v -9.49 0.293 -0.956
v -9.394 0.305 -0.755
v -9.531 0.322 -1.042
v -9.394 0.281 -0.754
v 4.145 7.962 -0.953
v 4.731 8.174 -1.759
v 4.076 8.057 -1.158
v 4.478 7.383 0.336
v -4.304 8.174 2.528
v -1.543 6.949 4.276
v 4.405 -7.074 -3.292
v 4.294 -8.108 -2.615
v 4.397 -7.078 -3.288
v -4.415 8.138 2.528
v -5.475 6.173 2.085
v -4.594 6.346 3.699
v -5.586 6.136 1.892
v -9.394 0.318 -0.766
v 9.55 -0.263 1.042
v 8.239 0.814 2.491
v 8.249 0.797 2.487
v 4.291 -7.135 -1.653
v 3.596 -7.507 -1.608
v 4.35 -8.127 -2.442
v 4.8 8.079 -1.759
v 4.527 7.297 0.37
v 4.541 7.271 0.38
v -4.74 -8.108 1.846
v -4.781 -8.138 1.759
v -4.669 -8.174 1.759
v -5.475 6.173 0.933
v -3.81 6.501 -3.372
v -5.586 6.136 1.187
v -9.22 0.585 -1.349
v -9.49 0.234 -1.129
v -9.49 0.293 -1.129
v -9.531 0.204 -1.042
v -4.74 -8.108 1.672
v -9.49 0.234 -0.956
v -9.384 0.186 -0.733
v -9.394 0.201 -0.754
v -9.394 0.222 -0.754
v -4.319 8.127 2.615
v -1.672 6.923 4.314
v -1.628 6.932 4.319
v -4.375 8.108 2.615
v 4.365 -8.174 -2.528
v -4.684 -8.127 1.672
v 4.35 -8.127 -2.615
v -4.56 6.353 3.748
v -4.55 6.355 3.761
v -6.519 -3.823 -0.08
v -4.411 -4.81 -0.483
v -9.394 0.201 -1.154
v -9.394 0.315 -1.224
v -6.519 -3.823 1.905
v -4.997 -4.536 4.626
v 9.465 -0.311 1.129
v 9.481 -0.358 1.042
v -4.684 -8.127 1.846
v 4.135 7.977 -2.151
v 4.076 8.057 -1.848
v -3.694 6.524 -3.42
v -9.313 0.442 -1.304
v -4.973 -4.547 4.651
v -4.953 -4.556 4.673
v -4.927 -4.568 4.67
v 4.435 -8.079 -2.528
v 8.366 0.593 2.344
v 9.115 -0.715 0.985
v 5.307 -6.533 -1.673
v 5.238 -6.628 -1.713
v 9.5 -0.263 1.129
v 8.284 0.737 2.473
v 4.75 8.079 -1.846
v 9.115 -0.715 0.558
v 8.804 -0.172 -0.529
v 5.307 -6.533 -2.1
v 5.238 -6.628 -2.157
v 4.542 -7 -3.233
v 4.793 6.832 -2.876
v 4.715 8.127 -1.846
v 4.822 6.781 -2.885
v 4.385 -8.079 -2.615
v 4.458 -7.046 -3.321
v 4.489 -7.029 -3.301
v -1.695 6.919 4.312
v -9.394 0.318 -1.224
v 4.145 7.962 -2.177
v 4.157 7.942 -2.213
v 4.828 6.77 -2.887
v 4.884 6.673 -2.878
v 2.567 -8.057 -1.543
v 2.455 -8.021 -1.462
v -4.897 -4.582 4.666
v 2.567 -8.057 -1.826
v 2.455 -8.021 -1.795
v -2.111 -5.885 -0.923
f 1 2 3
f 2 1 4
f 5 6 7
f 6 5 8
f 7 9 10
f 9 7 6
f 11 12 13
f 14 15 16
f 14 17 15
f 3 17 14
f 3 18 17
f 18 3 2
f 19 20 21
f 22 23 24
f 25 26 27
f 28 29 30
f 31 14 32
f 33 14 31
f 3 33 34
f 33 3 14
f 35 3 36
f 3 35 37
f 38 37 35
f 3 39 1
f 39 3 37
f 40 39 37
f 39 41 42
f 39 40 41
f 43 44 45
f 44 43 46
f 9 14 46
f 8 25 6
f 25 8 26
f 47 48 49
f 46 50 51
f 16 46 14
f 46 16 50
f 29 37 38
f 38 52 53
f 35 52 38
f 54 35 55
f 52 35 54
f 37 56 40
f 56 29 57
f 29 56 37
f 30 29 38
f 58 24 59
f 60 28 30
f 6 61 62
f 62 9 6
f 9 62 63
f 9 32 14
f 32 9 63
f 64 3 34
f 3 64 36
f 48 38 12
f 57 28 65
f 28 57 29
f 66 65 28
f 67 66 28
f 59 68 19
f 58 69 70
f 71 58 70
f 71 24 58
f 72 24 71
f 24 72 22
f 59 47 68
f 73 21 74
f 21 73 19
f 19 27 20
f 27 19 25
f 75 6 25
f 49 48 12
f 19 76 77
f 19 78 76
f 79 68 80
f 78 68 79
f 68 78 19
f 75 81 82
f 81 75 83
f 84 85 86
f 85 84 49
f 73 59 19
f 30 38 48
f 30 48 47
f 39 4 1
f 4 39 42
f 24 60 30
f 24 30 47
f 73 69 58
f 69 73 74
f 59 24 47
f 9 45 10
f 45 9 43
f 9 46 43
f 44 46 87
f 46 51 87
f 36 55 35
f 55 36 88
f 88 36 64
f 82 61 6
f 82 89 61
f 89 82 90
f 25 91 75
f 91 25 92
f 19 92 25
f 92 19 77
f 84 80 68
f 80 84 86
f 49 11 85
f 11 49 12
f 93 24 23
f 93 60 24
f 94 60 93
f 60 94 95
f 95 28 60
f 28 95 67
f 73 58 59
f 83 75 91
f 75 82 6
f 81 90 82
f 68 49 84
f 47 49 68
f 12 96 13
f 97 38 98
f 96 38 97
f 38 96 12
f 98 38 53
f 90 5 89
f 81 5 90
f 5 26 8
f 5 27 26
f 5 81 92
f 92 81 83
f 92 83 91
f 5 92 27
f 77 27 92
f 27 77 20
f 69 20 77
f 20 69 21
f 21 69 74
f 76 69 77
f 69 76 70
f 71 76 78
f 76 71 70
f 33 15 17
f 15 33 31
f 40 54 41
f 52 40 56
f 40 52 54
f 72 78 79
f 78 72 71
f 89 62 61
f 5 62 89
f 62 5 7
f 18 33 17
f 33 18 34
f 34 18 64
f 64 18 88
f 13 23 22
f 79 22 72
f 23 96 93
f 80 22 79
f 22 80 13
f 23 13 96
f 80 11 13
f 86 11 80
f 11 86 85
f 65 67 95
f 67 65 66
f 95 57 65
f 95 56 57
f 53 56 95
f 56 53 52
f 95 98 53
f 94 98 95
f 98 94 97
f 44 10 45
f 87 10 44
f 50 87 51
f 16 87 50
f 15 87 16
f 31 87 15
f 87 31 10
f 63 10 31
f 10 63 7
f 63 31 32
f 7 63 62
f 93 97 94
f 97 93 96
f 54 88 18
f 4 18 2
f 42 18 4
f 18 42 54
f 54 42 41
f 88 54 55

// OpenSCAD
// Auto-generated OpenSCAD file

    inner_points = 10*[[-0.9313235840465552, 0.025941713534936496, 0.24961039887898973], [0.18176070420337553, 0.09962140742080969, -0.9224171855702517], [-0.21156256215452457, -0.14515796252296415, 0.9224171855702517], [0.9015217260954063, -0.07147826863709097, -0.24961039887898973], [-0.6438494477287671, -0.3764461593931605, -0.6195516232254873], [-0.5505502074210448, 0.607754695616786, -0.46907262550257495], [0.5207483494698958, -0.6532912507189405, 0.46907262550257495], [0.6140475897776181, 0.330909604291006, 0.6195516232254873], [0.2535803612941774, -0.7962352175813989, -0.48391650792537955], [0.4045417032366162, 0.7962352175814017, -0.24043637501668932]];

    outer_points = 10*[[-0.46997284627252917, -0.8078951994968868, 0.17589589984947596], [-0.43345305778897786, 0.8078951994968868, 0.25284835477167783], [0.43345305778897786, -0.8078951994968868, -0.25284835477167783], [0.46997284627252917, 0.8078951994968868, -0.17589589984947596], [-0.9449617853062939, 0.026321601166102375, -0.10422521197036727], [-0.5168120337823261, -0.026321601166102375, 0.7979479884286332], [0.5168120337823261, 0.026321601166102375, -0.7979479884286332], [0.9449617853062939, -0.026321601166102375, 0.10422521197036727], [-0.3350951898479052, 0.5418959379620255, -0.7060938346625941], [0.3576656603926969, 0.45671744731188046, 0.753653067322259]];

    // Convex hull for inner set (I)
    module inner_hull() {
        hull() {
            for (p = inner_points) {
                translate(p) sphere(r=0.1);
            }
        }
    }

    // Convex hull for outer set (O) minus inner hull (O \ I)
    module outer_minus_inner() {
        difference() {
            hull() {
                for (p = outer_points) {
                    translate(p) sphere(r=0.1);
                }
            }
            inner_hull(); // Subtract inner hull
        }
    }

    // Convex hull for outer set (O) minus all translated inner hulls
    module outer_minus_AllTranslationInner() {
        difference() {
            hull() {
                for (p = outer_points) {
                    translate(p) sphere(r=0.1);
                }
            }
            hull() {
                translate([0,0,50]) inner_hull();
                translate([0,0,-50]) inner_hull();
            }; // Subtract translated inner hulls
        }
    }

    // Difference between outer_minus_inner and outer_minus_AllTranslationInner
    module outer_minus_inner_diff() {
        difference() {
            // Outer minus inner
            difference() {
                hull() {
                    for (p = outer_points) {
                        translate(p) sphere(r=0.1);
                    }
                }
                inner_hull();
            }

            // Subtract Outer minus AllTranslationInner
            difference() {
                hull() {
                    for (p = outer_points) {
                        translate(p) sphere(r=0.1);
                    }
                }
                hull() {
                    translate([0,0,50]) inner_hull();
                    translate([0,0,-50]) inner_hull();
                };
            }
        }
    }

    // Rendering all with colors applied
    color([0, 1, 0, 1]) outer_minus_AllTranslationInner(); // Opaque green
    
